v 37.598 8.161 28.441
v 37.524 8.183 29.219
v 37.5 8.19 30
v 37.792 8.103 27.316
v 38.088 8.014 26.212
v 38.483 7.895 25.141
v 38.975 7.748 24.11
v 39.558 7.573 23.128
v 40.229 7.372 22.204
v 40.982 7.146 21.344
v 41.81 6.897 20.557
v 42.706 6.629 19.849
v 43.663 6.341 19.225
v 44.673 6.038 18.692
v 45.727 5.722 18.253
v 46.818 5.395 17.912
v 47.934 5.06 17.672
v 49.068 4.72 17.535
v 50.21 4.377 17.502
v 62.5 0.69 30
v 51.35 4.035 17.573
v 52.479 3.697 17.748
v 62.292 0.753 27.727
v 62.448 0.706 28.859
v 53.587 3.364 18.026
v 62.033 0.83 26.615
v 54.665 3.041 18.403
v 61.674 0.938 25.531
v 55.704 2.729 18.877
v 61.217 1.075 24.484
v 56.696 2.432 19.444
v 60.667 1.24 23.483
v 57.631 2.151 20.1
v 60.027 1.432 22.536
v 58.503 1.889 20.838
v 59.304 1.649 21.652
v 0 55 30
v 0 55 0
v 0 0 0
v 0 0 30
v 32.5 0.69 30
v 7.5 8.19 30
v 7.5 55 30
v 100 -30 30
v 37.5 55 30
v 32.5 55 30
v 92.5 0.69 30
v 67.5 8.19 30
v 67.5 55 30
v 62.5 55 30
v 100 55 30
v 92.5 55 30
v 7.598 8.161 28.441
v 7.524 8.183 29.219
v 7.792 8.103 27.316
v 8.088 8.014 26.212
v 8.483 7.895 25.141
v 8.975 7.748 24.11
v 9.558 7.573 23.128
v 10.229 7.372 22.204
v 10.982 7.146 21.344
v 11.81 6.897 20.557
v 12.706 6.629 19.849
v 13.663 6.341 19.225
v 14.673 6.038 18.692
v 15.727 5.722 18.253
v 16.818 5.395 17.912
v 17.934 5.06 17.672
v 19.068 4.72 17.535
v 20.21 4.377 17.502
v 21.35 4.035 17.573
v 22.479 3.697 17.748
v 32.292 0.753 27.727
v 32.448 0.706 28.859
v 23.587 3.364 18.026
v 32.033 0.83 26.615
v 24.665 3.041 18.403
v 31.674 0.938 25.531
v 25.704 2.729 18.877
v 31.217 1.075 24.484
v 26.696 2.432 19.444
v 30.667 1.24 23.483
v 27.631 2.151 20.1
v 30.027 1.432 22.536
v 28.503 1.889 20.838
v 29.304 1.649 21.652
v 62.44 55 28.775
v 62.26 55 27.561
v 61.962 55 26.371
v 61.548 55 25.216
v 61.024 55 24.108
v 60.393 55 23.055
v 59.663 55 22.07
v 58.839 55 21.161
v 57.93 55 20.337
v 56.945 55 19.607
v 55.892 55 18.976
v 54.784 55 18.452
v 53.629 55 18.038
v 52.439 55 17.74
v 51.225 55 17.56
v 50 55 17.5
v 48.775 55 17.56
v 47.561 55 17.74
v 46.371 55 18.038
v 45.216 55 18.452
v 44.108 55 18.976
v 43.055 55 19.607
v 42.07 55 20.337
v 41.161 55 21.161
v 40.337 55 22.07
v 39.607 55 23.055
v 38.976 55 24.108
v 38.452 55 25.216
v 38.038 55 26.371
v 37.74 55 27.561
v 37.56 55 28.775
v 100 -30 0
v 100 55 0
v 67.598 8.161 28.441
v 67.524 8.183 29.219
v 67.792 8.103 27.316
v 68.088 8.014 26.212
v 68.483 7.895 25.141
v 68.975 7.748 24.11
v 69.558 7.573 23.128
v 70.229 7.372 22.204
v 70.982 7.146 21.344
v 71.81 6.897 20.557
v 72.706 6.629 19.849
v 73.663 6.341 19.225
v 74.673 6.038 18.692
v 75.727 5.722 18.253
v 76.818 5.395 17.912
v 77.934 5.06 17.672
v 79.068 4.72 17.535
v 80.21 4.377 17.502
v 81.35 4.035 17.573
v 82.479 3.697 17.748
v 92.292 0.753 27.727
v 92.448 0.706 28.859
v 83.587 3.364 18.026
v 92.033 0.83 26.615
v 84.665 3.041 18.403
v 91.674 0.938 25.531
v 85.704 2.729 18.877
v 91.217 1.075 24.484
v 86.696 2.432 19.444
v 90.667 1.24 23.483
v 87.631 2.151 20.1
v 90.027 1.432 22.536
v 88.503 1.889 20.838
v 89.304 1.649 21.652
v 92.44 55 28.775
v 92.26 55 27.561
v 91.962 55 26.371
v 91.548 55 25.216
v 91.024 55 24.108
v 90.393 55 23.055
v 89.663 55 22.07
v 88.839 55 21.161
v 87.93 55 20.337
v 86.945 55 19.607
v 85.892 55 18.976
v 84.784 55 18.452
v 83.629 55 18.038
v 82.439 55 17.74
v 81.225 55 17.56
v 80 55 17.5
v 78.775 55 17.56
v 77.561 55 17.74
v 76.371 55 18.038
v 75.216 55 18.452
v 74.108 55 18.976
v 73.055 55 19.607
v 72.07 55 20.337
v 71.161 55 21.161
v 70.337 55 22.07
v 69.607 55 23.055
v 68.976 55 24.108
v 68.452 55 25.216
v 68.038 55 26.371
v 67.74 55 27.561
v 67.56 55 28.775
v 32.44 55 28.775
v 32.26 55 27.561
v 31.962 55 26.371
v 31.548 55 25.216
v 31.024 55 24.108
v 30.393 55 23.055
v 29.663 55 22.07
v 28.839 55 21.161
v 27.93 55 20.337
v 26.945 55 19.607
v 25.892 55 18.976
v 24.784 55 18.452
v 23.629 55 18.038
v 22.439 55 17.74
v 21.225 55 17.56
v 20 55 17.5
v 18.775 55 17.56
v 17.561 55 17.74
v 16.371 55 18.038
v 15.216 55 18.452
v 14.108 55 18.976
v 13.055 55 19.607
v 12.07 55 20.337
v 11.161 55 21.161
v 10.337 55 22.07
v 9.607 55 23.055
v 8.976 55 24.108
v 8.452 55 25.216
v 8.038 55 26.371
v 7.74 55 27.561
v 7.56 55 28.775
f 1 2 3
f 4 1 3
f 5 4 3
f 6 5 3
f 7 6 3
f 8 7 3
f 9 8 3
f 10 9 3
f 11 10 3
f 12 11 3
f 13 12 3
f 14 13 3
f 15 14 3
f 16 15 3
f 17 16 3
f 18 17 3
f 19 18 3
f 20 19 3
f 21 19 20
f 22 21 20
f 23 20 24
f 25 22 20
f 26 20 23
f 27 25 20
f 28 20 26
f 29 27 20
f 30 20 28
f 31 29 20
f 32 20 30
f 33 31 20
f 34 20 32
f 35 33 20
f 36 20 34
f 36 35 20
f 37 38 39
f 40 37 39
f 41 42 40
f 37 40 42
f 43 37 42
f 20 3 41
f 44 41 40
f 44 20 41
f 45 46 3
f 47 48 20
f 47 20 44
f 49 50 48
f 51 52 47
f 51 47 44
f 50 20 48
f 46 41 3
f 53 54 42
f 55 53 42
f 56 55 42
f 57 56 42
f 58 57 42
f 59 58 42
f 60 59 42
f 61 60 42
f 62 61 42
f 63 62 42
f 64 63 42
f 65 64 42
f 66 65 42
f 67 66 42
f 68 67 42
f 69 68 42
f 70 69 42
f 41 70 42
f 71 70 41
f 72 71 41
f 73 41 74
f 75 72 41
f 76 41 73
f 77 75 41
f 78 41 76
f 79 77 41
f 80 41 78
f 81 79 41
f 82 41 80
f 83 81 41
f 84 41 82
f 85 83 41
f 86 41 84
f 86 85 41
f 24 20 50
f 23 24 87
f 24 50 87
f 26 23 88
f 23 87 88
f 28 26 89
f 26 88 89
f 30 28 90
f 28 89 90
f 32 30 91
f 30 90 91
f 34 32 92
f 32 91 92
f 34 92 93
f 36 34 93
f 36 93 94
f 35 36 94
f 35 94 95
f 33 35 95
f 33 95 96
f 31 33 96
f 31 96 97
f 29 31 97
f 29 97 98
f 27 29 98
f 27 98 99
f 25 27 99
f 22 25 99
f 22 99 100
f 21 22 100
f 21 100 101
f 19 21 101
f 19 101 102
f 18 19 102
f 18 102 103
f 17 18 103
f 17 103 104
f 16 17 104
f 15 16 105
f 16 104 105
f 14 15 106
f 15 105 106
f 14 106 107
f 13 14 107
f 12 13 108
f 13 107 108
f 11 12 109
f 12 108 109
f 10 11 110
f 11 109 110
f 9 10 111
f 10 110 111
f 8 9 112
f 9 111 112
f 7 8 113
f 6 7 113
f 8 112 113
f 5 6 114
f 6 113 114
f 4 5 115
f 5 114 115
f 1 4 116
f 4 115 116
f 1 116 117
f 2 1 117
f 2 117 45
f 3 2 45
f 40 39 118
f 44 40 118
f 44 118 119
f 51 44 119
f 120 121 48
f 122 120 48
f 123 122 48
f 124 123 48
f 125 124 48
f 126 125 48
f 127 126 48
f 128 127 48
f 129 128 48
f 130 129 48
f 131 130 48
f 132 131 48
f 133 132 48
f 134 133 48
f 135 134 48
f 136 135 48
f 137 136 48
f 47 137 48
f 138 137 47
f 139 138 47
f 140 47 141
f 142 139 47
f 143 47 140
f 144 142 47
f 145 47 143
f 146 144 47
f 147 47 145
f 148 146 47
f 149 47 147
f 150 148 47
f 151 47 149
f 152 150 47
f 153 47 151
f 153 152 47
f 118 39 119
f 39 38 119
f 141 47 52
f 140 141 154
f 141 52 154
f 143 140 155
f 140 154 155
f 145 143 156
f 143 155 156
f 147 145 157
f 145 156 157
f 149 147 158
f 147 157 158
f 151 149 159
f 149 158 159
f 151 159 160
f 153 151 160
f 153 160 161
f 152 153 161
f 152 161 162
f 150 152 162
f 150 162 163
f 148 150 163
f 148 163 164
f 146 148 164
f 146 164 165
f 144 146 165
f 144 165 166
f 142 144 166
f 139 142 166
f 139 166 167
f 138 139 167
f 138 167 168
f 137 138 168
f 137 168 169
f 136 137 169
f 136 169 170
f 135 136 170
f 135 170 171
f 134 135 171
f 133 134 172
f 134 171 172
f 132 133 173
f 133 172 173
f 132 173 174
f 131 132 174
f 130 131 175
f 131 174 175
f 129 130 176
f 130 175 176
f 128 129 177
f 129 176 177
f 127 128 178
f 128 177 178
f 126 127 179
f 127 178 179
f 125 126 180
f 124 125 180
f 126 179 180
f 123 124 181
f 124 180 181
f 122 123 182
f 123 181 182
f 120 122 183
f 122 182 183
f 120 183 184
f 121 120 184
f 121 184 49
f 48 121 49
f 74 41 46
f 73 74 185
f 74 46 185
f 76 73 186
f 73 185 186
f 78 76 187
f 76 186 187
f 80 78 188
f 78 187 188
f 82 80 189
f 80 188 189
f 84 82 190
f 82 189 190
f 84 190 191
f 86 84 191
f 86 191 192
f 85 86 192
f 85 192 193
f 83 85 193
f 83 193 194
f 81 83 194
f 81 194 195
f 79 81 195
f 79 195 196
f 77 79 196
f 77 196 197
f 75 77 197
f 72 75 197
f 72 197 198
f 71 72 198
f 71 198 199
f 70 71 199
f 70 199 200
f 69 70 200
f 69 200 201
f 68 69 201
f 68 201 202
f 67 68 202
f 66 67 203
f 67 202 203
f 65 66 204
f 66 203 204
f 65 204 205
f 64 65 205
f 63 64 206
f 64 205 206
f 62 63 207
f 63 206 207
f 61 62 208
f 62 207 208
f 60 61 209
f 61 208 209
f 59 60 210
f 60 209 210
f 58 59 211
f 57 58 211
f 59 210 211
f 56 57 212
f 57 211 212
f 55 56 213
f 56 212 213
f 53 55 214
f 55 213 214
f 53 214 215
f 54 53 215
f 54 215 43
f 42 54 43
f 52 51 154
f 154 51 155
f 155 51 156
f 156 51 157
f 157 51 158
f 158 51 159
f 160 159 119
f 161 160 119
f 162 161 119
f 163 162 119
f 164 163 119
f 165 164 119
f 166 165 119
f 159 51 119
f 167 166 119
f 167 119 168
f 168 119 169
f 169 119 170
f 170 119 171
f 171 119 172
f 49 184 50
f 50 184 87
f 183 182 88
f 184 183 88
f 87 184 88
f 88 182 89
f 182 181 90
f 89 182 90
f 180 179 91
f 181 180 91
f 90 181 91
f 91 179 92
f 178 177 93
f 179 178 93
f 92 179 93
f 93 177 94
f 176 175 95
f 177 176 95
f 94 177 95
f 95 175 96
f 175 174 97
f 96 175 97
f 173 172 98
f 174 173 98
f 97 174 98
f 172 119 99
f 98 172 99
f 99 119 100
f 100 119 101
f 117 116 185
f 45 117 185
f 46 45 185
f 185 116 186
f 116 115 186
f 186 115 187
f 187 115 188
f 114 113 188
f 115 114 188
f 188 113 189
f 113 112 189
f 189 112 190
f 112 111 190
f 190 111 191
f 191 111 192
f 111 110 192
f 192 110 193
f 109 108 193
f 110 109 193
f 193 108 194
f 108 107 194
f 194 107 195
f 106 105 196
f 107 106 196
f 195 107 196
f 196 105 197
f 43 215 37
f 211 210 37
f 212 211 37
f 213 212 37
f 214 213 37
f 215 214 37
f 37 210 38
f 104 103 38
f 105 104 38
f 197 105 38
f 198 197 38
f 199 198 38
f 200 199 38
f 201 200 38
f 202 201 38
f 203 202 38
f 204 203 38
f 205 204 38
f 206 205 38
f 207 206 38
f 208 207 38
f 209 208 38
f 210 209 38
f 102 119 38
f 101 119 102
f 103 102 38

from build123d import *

# Parameters (mm, degrees)
EXTRUDE1_DEPTH  = 30
EXTRUDE2_REACH  = 136.629
SKETCH2_R       = 12.5
LPATTERN1_COUNT = 3
LPATTERN1_PITCH = 30


with BuildPart() as part:
    # Sketch1 → Extrude1 (new body)
    with BuildSketch(Plane.XY):
        Polygon((0, 0), (100, -30), (100, 55), (0, 55), align=None)
    extrude(amount=EXTRUDE1_DEPTH)

    # Extrude2: up to this plane
    extrude2_end = Plane(origin=(2.873478856, 9.578262852, 30), z_dir=(0.2873478855663455, 0.9578262852211514, 0))
    # Sketch2 → Extrude2 (cut, up to the surface)
    with BuildSketch(Plane(origin=(0, 55, 0), x_dir=(1, 0, 0), z_dir=(0, 1, 0)), mode=Mode.PRIVATE) as extrude2_sk1:
        with Locations((20, -30)):
            Circle(SKETCH2_R)
    extrude2_tool1 = split(extrude(extrude2_sk1.sketch, amount=-EXTRUDE2_REACH, mode=Mode.PRIVATE), bisect_by=extrude2_end, keep=Keep.BOTH, mode=Mode.PRIVATE)
    extrude2 = extrude2_tool1.solids().sort_by_distance((20, 55, 30))[0]
    add(extrude2, mode=Mode.SUBTRACT)

    # LPattern1: Extrude2 ×3
    with Locations(*[(i * LPATTERN1_PITCH, 0, 0) for i in range(1, LPATTERN1_COUNT)]):
        add(extrude2, mode=Mode.SUBTRACT)


solid = part.part
